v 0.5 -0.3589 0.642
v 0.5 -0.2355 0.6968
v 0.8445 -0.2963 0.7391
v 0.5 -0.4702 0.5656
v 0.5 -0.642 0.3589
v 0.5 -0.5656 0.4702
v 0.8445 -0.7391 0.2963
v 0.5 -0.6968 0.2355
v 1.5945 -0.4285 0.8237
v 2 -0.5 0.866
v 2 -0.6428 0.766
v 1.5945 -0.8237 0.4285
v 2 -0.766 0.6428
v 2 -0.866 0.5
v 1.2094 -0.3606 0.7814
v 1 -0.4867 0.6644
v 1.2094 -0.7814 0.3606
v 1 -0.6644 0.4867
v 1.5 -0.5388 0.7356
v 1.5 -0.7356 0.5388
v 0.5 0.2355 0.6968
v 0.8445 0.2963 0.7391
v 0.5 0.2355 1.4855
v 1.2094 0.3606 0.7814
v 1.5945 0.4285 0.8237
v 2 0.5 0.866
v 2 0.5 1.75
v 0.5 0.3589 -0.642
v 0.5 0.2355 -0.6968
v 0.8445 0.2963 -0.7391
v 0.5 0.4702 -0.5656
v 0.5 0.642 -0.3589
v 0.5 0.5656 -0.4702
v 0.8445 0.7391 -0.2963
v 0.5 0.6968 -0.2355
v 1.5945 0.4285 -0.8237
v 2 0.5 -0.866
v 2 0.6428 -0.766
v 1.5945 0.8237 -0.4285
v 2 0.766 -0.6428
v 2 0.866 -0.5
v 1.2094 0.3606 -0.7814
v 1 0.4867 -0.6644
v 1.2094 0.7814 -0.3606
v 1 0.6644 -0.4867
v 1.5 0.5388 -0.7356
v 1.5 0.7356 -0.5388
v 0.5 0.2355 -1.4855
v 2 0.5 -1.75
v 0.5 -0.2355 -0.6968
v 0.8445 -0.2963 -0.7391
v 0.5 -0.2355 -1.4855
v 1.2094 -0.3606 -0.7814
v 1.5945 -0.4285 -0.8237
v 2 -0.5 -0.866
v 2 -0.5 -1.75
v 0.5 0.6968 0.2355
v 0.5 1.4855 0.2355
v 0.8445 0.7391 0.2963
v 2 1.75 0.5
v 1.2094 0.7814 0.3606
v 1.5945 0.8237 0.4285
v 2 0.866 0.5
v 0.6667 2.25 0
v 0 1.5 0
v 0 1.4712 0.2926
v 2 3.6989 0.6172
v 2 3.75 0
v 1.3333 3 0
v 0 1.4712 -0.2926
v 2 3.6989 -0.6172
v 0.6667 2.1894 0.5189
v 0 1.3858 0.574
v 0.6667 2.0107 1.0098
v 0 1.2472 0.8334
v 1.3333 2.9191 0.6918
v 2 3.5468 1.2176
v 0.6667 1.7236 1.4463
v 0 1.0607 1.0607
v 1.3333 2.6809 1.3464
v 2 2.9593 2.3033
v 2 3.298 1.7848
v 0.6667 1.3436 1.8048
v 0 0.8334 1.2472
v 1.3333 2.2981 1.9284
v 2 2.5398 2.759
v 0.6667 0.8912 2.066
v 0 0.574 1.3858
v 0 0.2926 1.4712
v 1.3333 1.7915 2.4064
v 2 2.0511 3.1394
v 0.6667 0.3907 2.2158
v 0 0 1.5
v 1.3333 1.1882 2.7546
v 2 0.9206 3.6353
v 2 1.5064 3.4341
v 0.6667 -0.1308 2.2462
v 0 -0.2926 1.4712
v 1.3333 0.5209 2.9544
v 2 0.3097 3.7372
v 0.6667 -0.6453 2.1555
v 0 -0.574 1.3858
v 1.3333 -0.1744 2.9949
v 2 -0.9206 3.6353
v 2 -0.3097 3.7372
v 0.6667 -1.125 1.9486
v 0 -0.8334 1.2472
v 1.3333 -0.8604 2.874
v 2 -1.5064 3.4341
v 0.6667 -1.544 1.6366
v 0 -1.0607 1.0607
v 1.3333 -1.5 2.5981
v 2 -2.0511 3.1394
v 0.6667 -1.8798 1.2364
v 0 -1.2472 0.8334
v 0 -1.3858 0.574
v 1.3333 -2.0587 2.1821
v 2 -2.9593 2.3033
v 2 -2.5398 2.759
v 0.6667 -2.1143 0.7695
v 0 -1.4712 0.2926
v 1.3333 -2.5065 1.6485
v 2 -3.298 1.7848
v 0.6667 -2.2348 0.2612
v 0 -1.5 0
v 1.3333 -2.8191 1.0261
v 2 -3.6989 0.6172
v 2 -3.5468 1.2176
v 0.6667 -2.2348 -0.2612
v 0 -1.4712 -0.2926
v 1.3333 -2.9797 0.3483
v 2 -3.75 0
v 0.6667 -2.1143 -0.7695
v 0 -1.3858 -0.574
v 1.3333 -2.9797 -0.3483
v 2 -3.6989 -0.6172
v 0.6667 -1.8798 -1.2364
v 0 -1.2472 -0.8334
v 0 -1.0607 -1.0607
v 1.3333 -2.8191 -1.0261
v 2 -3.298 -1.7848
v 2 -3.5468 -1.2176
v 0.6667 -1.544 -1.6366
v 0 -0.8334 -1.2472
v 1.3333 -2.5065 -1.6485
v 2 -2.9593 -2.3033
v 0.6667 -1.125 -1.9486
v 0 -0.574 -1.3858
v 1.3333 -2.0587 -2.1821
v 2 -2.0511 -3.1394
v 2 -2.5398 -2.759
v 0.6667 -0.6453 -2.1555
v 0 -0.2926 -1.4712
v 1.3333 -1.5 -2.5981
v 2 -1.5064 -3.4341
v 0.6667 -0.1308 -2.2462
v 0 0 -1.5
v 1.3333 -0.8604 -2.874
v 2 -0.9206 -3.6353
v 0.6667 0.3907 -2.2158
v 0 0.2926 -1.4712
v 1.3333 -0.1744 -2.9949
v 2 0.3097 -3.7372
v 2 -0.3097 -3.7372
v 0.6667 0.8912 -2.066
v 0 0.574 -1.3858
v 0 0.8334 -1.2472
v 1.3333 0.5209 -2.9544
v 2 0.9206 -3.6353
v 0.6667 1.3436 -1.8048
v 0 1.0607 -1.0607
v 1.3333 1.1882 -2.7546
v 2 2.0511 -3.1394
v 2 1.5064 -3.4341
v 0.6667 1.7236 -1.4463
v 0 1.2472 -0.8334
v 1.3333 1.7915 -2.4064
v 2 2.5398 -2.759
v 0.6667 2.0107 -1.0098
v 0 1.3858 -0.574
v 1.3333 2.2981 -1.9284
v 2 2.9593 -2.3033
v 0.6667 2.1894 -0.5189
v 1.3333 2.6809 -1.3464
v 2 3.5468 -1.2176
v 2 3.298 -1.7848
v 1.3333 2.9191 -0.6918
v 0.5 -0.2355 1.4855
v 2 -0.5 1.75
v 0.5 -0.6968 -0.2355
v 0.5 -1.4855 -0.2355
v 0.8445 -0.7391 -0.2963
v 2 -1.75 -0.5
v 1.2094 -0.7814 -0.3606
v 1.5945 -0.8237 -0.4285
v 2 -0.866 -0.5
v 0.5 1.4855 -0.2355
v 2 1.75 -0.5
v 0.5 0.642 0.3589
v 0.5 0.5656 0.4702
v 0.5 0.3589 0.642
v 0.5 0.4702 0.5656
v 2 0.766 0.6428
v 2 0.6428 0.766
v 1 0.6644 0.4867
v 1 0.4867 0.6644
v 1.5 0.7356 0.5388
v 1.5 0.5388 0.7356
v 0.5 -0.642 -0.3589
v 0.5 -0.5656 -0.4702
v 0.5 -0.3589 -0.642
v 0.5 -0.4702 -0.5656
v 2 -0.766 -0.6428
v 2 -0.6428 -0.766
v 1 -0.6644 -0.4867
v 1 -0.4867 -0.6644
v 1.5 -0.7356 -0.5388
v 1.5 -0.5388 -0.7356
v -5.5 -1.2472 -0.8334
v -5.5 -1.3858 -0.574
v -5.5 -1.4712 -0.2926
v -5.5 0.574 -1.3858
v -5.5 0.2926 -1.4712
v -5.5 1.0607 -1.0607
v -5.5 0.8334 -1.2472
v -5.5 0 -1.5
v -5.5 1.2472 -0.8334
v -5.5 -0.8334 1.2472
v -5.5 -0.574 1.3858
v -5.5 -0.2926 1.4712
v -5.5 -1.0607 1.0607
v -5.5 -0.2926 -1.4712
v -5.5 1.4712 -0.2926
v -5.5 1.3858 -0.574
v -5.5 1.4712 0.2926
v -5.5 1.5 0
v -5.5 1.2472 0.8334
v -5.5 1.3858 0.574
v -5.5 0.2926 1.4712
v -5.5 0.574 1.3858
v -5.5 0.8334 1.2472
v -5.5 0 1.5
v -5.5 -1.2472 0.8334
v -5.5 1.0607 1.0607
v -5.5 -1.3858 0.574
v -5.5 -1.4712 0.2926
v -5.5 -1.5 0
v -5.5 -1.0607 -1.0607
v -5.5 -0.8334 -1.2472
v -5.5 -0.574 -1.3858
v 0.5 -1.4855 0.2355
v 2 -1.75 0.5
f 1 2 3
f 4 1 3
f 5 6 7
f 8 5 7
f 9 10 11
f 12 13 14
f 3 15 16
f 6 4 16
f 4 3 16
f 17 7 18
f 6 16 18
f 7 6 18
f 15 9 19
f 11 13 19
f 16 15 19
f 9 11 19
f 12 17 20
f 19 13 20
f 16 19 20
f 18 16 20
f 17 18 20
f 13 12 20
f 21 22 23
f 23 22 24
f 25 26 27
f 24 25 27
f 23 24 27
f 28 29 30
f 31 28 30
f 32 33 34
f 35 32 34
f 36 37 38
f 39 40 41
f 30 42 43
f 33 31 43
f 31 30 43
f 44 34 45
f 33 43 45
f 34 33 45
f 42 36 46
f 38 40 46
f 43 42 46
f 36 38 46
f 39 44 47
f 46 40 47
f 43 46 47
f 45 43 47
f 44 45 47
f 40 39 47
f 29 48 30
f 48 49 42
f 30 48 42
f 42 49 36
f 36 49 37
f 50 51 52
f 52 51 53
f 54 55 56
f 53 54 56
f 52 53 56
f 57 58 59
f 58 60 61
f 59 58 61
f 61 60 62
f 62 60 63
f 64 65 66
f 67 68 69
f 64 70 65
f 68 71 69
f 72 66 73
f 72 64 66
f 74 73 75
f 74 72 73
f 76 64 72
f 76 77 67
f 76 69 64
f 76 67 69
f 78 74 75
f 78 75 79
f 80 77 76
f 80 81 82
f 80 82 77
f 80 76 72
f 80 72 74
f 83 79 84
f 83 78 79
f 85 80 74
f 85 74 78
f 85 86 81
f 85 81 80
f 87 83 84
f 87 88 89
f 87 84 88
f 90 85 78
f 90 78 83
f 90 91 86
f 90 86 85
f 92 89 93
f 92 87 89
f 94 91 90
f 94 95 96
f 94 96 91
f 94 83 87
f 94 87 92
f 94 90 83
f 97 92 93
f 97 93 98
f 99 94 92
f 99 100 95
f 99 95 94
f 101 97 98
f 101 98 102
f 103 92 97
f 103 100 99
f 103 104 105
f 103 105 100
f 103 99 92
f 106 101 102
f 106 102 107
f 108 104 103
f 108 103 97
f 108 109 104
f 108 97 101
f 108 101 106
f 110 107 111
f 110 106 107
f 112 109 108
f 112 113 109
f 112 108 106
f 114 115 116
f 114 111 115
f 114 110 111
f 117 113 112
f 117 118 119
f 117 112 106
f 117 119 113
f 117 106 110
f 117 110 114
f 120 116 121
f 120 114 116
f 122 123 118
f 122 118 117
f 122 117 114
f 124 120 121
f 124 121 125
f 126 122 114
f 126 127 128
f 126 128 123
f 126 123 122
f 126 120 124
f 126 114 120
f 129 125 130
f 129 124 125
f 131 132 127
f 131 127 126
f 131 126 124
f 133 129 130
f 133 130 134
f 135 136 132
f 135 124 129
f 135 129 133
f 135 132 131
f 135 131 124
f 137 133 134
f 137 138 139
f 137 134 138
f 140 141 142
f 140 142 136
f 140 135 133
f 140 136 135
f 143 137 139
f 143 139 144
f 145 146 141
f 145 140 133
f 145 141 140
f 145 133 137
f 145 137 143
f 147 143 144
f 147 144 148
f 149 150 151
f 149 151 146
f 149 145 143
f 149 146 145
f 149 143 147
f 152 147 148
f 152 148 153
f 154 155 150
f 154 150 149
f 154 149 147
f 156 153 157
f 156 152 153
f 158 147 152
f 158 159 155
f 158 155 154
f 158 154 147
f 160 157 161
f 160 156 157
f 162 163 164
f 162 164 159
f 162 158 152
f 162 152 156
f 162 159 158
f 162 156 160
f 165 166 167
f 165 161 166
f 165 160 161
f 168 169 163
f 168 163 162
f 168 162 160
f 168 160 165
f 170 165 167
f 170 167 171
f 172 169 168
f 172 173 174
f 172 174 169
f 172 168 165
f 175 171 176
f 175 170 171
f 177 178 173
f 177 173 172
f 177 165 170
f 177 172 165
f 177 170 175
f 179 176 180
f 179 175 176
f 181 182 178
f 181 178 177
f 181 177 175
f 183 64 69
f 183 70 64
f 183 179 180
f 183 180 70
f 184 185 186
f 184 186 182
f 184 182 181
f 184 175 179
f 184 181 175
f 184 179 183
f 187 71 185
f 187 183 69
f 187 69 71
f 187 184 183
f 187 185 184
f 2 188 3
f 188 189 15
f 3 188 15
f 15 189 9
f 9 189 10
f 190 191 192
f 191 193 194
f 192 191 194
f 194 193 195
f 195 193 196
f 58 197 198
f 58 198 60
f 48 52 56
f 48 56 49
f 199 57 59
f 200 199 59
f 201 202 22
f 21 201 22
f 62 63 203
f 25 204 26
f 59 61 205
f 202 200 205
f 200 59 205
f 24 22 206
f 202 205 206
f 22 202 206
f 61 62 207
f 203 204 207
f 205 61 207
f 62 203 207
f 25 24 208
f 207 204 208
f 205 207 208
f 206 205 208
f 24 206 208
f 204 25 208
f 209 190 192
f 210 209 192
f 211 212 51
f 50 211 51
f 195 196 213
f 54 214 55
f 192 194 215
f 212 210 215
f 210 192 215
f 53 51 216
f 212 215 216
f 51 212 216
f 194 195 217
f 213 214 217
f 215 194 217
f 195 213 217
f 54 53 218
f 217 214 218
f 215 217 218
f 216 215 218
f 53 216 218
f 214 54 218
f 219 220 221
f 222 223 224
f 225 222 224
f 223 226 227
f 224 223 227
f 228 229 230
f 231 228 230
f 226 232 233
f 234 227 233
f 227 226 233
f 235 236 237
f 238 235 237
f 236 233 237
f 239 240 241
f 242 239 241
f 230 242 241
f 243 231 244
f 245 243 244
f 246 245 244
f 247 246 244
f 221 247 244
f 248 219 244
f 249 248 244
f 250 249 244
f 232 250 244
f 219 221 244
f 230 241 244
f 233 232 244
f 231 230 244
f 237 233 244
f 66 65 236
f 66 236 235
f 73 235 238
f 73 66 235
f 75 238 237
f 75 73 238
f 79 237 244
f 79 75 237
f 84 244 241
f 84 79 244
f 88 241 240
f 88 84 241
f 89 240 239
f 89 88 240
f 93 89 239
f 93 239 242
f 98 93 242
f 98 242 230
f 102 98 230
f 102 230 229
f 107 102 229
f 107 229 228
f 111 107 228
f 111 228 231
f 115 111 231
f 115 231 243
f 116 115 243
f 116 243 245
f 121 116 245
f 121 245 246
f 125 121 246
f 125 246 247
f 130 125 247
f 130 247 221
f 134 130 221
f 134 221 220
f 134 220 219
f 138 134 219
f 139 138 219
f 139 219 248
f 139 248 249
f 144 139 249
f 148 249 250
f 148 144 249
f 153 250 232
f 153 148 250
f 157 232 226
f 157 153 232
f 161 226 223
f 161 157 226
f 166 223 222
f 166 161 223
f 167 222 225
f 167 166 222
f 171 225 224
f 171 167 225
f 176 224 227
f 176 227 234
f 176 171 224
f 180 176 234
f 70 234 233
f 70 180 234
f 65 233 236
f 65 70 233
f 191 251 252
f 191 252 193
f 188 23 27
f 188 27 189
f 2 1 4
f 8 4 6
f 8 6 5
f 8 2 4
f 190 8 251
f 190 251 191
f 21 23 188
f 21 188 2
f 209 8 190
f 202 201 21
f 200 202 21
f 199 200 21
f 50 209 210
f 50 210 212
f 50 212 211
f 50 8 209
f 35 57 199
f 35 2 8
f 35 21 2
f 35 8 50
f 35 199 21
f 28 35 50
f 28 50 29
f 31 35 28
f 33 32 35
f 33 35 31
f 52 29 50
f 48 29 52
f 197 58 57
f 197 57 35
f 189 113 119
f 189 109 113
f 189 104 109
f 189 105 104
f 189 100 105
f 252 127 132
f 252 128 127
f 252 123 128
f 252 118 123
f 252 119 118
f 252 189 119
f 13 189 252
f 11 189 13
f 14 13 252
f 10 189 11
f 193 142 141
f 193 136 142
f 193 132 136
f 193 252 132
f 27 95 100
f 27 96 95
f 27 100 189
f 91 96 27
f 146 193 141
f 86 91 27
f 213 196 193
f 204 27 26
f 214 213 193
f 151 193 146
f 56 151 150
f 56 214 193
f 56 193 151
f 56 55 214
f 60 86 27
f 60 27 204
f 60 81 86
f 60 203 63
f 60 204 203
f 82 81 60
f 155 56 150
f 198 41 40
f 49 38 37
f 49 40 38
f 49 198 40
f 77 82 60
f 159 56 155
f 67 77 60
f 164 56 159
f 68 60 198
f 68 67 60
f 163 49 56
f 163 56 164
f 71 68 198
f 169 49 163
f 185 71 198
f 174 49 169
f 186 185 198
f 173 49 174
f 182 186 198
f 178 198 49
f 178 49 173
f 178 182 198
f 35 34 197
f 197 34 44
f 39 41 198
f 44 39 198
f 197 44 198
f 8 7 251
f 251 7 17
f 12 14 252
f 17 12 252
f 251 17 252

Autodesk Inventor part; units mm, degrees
ref_plane "YZ Plane" through (0, 0, 0) normal (1, 0, 0) x (0, 1, 0)
ref_plane "XZ Plane" through (0, 0, 0) normal (0, 1, 0) x (-1, 0, 0)
sketch "Sketch1" plane through (0, 0, 0) normal (1, 0, 0) x (0, 1, 0)
  circle A0 centre (0, 0) radius 1.5
  dimension "d0" = 3
extrude "Extrusion1" add sketch "Sketch1" against normal blind 5.5
ref_plane "Work Plane1" through (2, 0, 0) normal (1, 0, 0) x (0, 0, -1)
sketch "Sketch2" plane through (2, 0, 0) normal (1, 0, 0) x (0, 0, -1)
  circle A0 centre (0, 0) radius 3.75
  dimension "d4" = 7.5
loft "Loft1" add profiles "Sketch2" section 1 edges at (0, -1.5, 0)
sketch "Sketch3" plane through (2, 0, 0) normal (1, 0, 0) x (0, 0, -1)
  line L0 (-0.5, -1.75) -> (0.5, -1.75)
  line L1 (0.5, 1.75) -> (-0.5, 1.75)
  line L2 (1.75, -0.5) -> (1.75, 0.5)
  line L3 (-1.75, 0.5) -> (-1.75, -0.5)
  line L4 (0.5, -1.75) -> (0.5, -0.866)
  line L5 (0.5, 0.866) -> (0.5, 1.75)
  line L6 (-1.75, -0.5) -> (-0.866, -0.5)
  line L7 (0.866, -0.5) -> (1.75, -0.5)
  arc A0 (0.5, -0.866) -> (0.866, -0.5) centre (0, 0) ccw
  line L8 (1.75, 0.5) -> (0.866, 0.5)
  line L9 (-0.866, 0.5) -> (-1.75, 0.5)
  line L10 (-0.5, 1.75) -> (-0.5, 0.866)
  line L11 (-0.5, -0.866) -> (-0.5, -1.75)
  arc A1 (0.866, 0.5) -> (0.5, 0.866) centre (0, 0) ccw
  arc A2 (-0.5, 0.866) -> (-0.866, 0.5) centre (0, 0) ccw
  arc A3 (-0.866, -0.5) -> (-0.5, -0.866) centre (0, 0) ccw
  dimension "d9" = 1
  dimension "d10" = 3.5
  dimension "d11" = 1
  dimension "d12" = 3.5
extrude "Extrusion2" cut sketch "Sketch3" against normal blind 1.5 draft -10
thread "Thread1" size "M3x0.5" class "6g" standard "ANSI Metric M Profile" full length
properties part number "Parafuso do Escudo"
